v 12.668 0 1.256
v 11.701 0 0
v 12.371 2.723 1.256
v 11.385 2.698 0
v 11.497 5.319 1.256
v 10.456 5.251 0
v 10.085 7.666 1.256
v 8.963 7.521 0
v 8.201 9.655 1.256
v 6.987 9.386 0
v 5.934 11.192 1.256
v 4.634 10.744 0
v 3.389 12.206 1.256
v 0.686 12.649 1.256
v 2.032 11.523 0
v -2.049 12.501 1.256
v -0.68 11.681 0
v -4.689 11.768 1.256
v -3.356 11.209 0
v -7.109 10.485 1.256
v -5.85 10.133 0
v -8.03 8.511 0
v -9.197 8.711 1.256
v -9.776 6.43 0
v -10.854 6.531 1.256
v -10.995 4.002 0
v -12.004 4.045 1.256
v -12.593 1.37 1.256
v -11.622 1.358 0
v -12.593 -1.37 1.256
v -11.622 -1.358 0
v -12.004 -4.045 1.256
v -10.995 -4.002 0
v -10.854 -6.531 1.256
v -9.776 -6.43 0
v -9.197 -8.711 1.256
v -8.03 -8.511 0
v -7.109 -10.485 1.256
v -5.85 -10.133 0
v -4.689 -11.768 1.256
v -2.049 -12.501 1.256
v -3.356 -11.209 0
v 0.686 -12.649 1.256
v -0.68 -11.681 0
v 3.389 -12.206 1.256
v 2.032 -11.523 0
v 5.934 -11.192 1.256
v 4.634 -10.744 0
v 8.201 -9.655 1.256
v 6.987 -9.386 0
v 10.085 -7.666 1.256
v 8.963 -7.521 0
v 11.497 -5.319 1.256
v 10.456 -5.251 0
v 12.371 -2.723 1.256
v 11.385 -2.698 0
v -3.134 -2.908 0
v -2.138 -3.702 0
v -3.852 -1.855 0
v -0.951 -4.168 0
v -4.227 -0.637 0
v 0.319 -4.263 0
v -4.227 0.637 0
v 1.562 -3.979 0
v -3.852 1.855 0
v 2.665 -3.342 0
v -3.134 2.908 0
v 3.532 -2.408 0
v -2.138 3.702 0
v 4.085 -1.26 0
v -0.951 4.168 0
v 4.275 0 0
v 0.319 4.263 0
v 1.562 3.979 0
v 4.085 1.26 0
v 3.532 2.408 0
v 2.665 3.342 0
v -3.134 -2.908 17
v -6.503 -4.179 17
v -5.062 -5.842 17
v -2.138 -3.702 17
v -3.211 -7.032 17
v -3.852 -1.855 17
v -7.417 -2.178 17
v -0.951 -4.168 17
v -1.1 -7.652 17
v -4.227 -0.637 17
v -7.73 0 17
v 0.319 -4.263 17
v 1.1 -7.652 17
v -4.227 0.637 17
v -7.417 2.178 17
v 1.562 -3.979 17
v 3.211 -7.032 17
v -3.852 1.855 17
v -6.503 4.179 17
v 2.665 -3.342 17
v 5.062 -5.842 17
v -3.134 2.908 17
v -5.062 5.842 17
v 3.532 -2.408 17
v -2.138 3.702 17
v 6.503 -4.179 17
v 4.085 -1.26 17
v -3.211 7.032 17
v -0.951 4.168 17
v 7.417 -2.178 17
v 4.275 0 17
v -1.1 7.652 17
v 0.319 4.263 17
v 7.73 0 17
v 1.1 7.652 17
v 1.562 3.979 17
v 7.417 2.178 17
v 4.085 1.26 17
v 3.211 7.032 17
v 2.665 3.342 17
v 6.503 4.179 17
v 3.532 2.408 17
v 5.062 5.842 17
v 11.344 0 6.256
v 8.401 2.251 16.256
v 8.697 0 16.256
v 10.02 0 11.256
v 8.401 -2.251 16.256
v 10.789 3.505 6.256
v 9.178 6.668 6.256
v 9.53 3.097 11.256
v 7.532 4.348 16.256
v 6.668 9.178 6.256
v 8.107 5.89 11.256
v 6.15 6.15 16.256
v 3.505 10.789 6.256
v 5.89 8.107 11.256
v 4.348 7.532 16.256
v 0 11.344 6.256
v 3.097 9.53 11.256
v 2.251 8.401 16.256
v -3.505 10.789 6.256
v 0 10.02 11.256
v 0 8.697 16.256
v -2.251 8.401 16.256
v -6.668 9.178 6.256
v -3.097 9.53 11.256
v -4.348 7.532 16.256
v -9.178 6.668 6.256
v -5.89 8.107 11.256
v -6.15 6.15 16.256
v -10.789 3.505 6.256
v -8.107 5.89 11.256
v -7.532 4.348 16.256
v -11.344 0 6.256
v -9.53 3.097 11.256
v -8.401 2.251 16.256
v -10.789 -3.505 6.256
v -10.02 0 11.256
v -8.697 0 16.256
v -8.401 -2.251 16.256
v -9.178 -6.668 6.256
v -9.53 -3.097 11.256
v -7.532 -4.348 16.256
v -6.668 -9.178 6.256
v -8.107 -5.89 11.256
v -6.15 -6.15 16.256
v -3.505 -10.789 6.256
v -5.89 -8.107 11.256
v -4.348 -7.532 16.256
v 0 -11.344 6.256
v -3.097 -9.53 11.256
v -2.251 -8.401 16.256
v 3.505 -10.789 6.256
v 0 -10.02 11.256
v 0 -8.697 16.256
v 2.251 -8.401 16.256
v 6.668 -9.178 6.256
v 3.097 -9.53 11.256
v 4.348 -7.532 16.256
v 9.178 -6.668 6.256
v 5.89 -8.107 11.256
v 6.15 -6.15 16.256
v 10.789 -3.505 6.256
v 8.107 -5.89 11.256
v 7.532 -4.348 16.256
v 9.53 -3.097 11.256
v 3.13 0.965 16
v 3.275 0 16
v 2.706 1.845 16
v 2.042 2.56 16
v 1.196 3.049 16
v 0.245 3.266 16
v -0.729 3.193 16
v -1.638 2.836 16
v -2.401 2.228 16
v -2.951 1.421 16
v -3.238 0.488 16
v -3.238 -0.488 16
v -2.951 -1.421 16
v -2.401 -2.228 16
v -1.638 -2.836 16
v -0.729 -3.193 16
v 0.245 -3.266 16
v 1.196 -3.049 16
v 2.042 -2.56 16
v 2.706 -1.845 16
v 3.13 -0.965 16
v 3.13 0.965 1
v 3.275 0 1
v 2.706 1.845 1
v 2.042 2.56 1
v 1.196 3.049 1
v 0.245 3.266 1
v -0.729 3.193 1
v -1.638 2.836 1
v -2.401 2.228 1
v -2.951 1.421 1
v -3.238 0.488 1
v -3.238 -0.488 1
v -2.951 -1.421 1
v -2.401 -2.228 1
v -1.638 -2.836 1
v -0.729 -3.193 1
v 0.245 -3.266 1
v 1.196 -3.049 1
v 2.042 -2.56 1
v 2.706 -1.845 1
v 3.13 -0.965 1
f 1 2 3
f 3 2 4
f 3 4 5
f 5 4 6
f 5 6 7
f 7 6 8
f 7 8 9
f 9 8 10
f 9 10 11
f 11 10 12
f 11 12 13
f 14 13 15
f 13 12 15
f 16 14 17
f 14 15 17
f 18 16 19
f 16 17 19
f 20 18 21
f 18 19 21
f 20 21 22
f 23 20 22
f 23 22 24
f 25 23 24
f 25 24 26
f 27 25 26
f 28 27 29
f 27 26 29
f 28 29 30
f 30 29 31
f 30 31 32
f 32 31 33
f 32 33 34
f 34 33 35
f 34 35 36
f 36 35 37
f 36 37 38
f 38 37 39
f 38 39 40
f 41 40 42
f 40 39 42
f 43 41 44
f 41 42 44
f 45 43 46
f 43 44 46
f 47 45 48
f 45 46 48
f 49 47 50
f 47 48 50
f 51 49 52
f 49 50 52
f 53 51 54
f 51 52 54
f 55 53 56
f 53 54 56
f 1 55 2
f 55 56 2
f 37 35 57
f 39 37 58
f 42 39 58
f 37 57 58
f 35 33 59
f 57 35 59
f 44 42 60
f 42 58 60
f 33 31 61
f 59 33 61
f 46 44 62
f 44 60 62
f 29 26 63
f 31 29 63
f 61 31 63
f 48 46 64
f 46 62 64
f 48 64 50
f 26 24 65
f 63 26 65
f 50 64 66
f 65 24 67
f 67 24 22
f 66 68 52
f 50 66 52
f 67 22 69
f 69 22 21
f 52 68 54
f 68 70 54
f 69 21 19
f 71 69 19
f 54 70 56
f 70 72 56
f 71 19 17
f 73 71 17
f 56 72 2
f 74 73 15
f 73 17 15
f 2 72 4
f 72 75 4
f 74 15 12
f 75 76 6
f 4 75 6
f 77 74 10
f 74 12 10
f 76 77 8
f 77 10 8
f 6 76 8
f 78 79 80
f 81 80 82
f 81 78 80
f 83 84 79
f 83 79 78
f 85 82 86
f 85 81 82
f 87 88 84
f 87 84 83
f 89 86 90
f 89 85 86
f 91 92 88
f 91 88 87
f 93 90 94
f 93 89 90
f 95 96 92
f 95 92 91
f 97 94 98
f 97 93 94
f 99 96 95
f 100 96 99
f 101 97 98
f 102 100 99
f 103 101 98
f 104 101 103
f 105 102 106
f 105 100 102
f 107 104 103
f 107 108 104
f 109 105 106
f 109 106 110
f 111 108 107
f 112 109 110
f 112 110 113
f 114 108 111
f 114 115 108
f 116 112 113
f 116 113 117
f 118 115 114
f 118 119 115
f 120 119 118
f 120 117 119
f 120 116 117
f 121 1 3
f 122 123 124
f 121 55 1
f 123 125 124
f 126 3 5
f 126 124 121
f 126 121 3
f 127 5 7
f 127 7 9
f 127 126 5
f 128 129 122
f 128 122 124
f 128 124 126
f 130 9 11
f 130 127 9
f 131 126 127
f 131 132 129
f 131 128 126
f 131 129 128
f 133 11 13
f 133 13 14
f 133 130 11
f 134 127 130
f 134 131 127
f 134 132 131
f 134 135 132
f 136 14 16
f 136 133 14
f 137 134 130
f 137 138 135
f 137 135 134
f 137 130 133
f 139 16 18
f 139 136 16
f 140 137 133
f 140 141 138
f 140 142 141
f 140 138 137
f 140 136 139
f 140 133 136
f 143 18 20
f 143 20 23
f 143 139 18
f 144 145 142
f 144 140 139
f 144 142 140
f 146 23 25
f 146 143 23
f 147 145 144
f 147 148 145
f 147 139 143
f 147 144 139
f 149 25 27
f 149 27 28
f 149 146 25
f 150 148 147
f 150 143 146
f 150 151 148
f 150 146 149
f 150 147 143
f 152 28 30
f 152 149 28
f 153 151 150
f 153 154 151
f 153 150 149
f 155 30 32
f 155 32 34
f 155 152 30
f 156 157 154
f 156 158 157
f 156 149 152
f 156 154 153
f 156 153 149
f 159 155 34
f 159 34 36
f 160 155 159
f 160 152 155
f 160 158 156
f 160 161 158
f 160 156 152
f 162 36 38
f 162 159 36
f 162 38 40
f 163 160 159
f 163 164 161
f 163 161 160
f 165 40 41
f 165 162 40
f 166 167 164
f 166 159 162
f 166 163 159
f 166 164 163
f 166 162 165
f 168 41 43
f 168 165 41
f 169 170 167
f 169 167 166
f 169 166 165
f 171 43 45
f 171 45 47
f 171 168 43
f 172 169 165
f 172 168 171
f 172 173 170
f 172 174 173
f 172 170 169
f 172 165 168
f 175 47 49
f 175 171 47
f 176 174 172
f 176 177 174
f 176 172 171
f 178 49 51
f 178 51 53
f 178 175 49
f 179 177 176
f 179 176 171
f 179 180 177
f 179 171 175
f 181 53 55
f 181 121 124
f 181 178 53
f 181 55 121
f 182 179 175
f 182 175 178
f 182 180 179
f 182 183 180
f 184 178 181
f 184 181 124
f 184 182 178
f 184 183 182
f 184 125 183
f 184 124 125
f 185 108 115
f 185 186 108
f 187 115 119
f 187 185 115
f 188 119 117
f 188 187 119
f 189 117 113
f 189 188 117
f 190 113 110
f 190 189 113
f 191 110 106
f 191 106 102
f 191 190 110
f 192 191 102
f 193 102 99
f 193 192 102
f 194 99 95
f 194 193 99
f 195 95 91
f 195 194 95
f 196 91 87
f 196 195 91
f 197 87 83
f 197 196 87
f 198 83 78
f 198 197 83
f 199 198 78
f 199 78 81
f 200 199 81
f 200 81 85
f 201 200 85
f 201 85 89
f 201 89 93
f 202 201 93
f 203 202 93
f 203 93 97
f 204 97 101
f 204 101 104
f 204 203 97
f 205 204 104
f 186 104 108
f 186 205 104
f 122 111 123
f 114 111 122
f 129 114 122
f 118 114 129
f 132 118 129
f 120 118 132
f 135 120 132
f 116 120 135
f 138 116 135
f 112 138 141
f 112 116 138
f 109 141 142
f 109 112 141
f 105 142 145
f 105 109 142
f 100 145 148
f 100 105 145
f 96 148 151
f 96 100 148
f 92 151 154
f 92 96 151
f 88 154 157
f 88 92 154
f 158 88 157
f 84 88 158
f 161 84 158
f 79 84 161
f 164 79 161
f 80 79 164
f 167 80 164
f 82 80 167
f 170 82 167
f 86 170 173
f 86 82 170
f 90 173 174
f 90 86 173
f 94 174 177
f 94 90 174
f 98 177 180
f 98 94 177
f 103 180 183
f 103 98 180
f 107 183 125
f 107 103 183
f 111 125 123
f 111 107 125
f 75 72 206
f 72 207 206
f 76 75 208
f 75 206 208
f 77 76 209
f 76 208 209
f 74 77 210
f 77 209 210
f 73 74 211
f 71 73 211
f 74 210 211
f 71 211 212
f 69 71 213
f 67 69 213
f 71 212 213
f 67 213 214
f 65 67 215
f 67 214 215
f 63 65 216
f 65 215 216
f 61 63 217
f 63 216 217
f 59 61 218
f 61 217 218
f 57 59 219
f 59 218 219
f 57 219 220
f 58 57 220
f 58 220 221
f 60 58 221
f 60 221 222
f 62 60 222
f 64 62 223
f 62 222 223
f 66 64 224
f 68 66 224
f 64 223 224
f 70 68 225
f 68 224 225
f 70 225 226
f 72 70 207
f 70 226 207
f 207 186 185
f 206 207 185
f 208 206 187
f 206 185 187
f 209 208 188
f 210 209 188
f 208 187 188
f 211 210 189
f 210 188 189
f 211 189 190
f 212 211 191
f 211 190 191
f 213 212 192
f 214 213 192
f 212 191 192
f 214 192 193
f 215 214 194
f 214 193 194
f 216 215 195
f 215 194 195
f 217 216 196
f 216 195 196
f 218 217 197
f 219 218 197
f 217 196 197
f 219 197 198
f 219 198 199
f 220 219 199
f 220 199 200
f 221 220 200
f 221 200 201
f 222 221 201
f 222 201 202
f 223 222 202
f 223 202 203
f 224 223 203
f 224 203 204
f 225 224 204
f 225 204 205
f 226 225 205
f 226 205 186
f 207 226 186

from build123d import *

# Parameters (mm, degrees)
F0_R     = 13
F2_R     = 8.5
F4_R     = 3.275
F5_DEPTH = 25


# Not quite as in the source:
# - a fillet or chamfer that OpenCascade refuses, or shapes differently, is made with other operations: its cross-section is extruded or revolved along the edge and cut away or added


with BuildPart() as f3:
    # F0 (on Top) → F3 section 0
    with BuildSketch(Plane.XY):
        Circle(F0_R)
    # F2 (on offset) → F3 section 1
    with BuildSketch(Plane.XY.offset(17)):
        Circle(F2_R)
    loft()

    # F4 (on face) → F5 (cut)
    with BuildSketch(Plane.XY.offset(17)):
        Circle(F4_R)
    extrude(amount=-F5_DEPTH, mode=Mode.SUBTRACT)

    # F6: chamfer of 1 on 4 edges, made by hand

    # F6_s1 → F6_t2 (revolve, cut)
    with BuildSketch(Plane.XZ):
        Polygon((4.275, 17), (3.275, 16), (3.275, 17), align=None)
    revolve(axis=Axis((0, 0, 17), (0, 0, 1)), mode=Mode.SUBTRACT)

    # F6_s3 → F6_t4 (revolve, cut)
    with BuildSketch(Plane.XZ):
        Polygon((8.6969696164, 16.2558925603), (7.7302643885, 17), (8.5, 17), align=None)
    revolve(axis=Axis((0, 0, 17), (0, 0, 1)), mode=Mode.SUBTRACT)

    # F6_s5 → F6_t6 (revolve, cut)
    with BuildSketch(Plane.XZ):
        Polygon((12.6675578517, 1.2558925603), (11.7008526238, 0), (13, 0), align=None)
    revolve(axis=Axis((0, 0, 0), (0, 0, 1)), mode=Mode.SUBTRACT)

    # F6_s7 → F6_t8 (revolve, cut)
    with BuildSketch(Plane.XZ):
        Polygon((4.275, 0), (3.275, 1), (3.275, 0), align=None)
    revolve(axis=Axis((0, 0, 0), (0, 0, 1)), mode=Mode.SUBTRACT)


solid = f3.part
